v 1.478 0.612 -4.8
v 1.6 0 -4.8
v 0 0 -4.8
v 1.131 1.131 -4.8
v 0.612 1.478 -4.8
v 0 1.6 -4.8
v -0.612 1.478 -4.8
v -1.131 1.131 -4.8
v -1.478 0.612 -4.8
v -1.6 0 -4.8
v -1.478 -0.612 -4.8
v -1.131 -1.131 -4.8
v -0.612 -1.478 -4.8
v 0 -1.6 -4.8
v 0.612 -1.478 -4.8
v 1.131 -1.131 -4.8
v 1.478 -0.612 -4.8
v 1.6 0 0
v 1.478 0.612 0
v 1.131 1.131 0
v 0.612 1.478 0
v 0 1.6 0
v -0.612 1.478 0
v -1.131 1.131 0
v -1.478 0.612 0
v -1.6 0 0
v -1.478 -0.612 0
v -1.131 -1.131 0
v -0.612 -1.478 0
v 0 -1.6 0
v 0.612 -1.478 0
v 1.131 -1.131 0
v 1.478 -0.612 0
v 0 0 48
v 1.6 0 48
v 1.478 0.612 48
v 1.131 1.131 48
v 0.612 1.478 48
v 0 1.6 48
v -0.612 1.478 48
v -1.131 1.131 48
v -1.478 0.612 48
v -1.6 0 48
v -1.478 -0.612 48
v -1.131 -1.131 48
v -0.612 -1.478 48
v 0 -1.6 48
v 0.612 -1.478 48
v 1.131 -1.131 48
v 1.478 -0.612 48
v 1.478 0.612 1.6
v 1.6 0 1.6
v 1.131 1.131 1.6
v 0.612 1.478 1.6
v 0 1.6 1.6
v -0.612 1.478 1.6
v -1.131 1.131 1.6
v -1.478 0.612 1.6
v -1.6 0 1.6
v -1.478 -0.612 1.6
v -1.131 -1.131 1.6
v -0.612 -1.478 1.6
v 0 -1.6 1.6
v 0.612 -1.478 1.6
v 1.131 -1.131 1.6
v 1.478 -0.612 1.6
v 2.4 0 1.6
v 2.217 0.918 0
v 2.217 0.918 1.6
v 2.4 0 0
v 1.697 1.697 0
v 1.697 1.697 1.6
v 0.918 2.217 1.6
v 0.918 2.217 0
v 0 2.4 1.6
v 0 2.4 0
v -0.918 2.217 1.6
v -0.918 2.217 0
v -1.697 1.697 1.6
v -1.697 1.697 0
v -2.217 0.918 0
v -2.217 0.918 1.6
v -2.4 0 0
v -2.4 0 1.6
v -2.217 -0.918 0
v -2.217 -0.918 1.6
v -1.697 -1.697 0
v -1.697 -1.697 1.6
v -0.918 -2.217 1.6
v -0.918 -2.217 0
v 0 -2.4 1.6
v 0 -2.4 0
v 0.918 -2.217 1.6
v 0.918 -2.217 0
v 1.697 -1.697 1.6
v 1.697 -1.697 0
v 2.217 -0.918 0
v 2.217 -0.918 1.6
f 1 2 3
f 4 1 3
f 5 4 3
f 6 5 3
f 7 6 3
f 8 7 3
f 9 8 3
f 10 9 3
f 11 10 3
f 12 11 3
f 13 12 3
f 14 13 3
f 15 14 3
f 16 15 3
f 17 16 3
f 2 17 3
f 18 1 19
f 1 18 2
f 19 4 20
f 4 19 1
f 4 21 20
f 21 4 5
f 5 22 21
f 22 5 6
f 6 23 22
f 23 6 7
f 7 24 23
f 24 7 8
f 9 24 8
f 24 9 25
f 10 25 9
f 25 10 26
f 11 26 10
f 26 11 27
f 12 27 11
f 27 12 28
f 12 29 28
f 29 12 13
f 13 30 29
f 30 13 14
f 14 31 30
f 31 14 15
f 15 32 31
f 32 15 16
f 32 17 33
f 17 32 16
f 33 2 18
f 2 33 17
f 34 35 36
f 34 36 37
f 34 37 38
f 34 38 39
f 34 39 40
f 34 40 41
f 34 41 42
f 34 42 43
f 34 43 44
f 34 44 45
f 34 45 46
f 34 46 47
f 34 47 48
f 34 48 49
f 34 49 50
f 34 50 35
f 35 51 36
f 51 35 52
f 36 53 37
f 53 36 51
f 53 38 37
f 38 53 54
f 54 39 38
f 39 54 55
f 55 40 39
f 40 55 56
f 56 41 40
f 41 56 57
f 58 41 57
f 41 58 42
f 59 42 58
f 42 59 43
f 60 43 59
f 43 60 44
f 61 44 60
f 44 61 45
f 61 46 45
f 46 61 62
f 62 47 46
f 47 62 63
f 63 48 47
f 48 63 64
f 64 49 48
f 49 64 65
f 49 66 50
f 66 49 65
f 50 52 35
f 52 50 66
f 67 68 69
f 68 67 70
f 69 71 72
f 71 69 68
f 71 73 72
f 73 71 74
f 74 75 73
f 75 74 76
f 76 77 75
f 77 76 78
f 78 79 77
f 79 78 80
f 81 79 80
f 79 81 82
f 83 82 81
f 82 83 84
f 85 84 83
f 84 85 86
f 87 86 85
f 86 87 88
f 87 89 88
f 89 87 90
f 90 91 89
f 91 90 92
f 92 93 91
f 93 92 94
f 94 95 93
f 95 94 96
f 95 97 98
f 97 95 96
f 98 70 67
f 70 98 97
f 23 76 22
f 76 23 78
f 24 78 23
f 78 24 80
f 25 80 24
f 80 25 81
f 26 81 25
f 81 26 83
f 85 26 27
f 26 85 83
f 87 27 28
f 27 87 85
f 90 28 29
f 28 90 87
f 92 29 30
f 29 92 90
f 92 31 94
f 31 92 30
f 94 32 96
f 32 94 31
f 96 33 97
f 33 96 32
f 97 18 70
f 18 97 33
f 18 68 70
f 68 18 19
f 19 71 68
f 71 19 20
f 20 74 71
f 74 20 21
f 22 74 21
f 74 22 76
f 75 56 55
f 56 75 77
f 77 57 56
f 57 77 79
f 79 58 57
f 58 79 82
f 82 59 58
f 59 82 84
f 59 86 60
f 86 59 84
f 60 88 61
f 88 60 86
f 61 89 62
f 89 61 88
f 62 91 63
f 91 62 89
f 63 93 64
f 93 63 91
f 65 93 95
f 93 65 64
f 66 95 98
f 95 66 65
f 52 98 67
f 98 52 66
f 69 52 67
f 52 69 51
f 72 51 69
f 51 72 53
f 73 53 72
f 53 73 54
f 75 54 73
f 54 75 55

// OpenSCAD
// file: ../p/4-4edge.scad
use <../lib.scad>
function ldraw_lib__4_4edge() = [
// 0 Circle 1.0
// 0 Name: 4-4edge.dat
// 0 Author: James Jessiman
// 0 !LDRAW_ORG Primitive UPDATE 2017-01
// 0 !LICENSE Licensed under CC BY 2.0 and CC BY 4.0 : see CAreadme.txt
// 
// 0 BFC CERTIFY CCW
  [0,"BFC","CERTIFY"],
  [0,"BFC","CCW"],
// 
// 0 !HISTORY 1998-12-15 [PTadmin] Official Update 1998-10
// 0 !HISTORY 2005-12-28 [PTadmin] Official Update 2005-01
// 0 !HISTORY 2007-06-24 [PTadmin] Header formatted for Contributor Agreement
// 0 !HISTORY 2008-07-01 [PTadmin] Official Update 2008-01
// 0 !HISTORY 2017-01-15 [Steffen] BFCed
// 0 !HISTORY 2017-12-30 [PTadmin] Official Update 2017-01
// 
// 
// 2 24 1 0 0 0.9239 0 0.3827
  [2,24,1,0,0,0.9239,0,0.3827],
// 2 24 0.9239 0 0.3827 0.7071 0 0.7071
  [2,24,0.9239,0,0.3827,0.7071,0,0.7071],
// 2 24 0.7071 0 0.7071 0.3827 0 0.9239
  [2,24,0.7071,0,0.7071,0.3827,0,0.9239],
// 2 24 0.3827 0 0.9239 0 0 1
  [2,24,0.3827,0,0.9239,0,0,1],
// 2 24 0 0 1 -0.3827 0 0.9239
  [2,24,0,0,1,-0.3827,0,0.9239],
// 2 24 -0.3827 0 0.9239 -0.7071 0 0.7071
  [2,24,-0.3827,0,0.9239,-0.7071,0,0.7071],
// 2 24 -0.7071 0 0.7071 -0.9239 0 0.3827
  [2,24,-0.7071,0,0.7071,-0.9239,0,0.3827],
// 2 24 -0.9239 0 0.3827 -1 0 -0
  [2,24,-0.9239,0,0.3827,-1,0,-0],
// 2 24 -1 0 -0 -0.9239 0 -0.3827
  [2,24,-1,0,-0,-0.9239,0,-0.3827],
// 2 24 -0.9239 0 -0.3827 -0.7071 0 -0.7071
  [2,24,-0.9239,0,-0.3827,-0.7071,0,-0.7071],
// 2 24 -0.7071 0 -0.7071 -0.3827 0 -0.9239
  [2,24,-0.7071,0,-0.7071,-0.3827,0,-0.9239],
// 2 24 -0.3827 0 -0.9239 0 0 -1
  [2,24,-0.3827,0,-0.9239,0,0,-1],
// 2 24 0 0 -1 0.3827 0 -0.9239
  [2,24,0,0,-1,0.3827,0,-0.9239],
// 2 24 0.3827 0 -0.9239 0.7071 0 -0.7071
  [2,24,0.3827,0,-0.9239,0.7071,0,-0.7071],
// 2 24 0.7071 0 -0.7071 0.9239 0 -0.3827
  [2,24,0.7071,0,-0.7071,0.9239,0,-0.3827],
// 2 24 0.9239 0 -0.3827 1 0 0
  [2,24,0.9239,0,-0.3827,1,0,0],
];
module ldraw_lib__4_4edge(step=0, col=false, unit=2/5, alt=false, line=0.2, solid=!$preview)
    makepoly(ldraw_lib__4_4edge(), step=step, col=col, unit=unit, alt=alt, line=line, solid=solid);
ldraw_lib__4_4edge(line=0.2);
// file: ../p/4-4disc.scad
use <../lib.scad>
function ldraw_lib__4_4disc() = [
// 0 Disc 1.0
// 0 Name: 4-4disc.dat
// 0 Author: James Jessiman
// 0 !LDRAW_ORG Primitive UPDATE 2002-02
// 0 !LICENSE Licensed under CC BY 2.0 and CC BY 4.0 : see CAreadme.txt
// 
// 0 BFC CERTIFY CCW
  [0,"BFC","CERTIFY"],
  [0,"BFC","CCW"],
// 
// 0 !HISTORY 1998-12-15 [PTadmin] Official Update 1998-10
// 0 !HISTORY 2002-03-23 [sbliss] Added BFC statement
// 0 !HISTORY 2002-04-25 [PTadmin] Official Update 2002-02
// 0 !HISTORY 2007-06-24 [PTadmin] Header formatted for Contributor Agreement
// 0 !HISTORY 2008-07-01 [PTadmin] Official Update 2008-01
// 
// 
// 3 16 0 0 0 1 0 0 0.9239 0 0.3827
  [3,16,0,0,0,1,0,0,0.9239,0,0.3827],
// 3 16 0 0 0 0.9239 0 0.3827 0.7071 0 0.7071
  [3,16,0,0,0,0.9239,0,0.3827,0.7071,0,0.7071],
// 3 16 0 0 0 0.7071 0 0.7071 0.3827 0 0.9239
  [3,16,0,0,0,0.7071,0,0.7071,0.3827,0,0.9239],
// 3 16 0 0 0 0.3827 0 0.9239 0 0 1
  [3,16,0,0,0,0.3827,0,0.9239,0,0,1],
// 3 16 0 0 0 0 0 1 -0.3827 0 0.9239
  [3,16,0,0,0,0,0,1,-0.3827,0,0.9239],
// 3 16 0 0 0 -0.3827 0 0.9239 -0.7071 0 0.7071
  [3,16,0,0,0,-0.3827,0,0.9239,-0.7071,0,0.7071],
// 3 16 0 0 0 -0.7071 0 0.7071 -0.9239 0 0.3827
  [3,16,0,0,0,-0.7071,0,0.7071,-0.9239,0,0.3827],
// 3 16 0 0 0 -0.9239 0 0.3827 -1 0 -0
  [3,16,0,0,0,-0.9239,0,0.3827,-1,0,-0],
// 3 16 0 0 0 -1 0 -0 -0.9239 0 -0.3827
  [3,16,0,0,0,-1,0,-0,-0.9239,0,-0.3827],
// 3 16 0 0 0 -0.9239 0 -0.3827 -0.7071 0 -0.7071
  [3,16,0,0,0,-0.9239,0,-0.3827,-0.7071,0,-0.7071],
// 3 16 0 0 0 -0.7071 0 -0.7071 -0.3827 0 -0.9239
  [3,16,0,0,0,-0.7071,0,-0.7071,-0.3827,0,-0.9239],
// 3 16 0 0 0 -0.3827 0 -0.9239 0 0 -1
  [3,16,0,0,0,-0.3827,0,-0.9239,0,0,-1],
// 3 16 0 0 0 0 0 -1 0.3827 0 -0.9239
  [3,16,0,0,0,0,0,-1,0.3827,0,-0.9239],
// 3 16 0 0 0 0.3827 0 -0.9239 0.7071 0 -0.7071
  [3,16,0,0,0,0.3827,0,-0.9239,0.7071,0,-0.7071],
// 3 16 0 0 0 0.7071 0 -0.7071 0.9239 0 -0.3827
  [3,16,0,0,0,0.7071,0,-0.7071,0.9239,0,-0.3827],
// 3 16 0 0 0 0.9239 0 -0.3827 1 0 0
  [3,16,0,0,0,0.9239,0,-0.3827,1,0,0],
// 0
];
module ldraw_lib__4_4disc(step=0, col=false, unit=2/5, alt=false, line=0.2, solid=!$preview)
    makepoly(ldraw_lib__4_4disc(), step=step, col=col, unit=unit, alt=alt, line=line, solid=solid);
ldraw_lib__4_4disc(line=0.2);
// file: ../p/4-4cyli.scad
use <../lib.scad>
function ldraw_lib__4_4cyli() = [
// 0 Cylinder 1.0
// 0 Name: 4-4cyli.dat
// 0 Author: James Jessiman
// 0 !LDRAW_ORG Primitive UPDATE 2005-01
// 0 !LICENSE Licensed under CC BY 2.0 and CC BY 4.0 : see CAreadme.txt
// 
// 0 BFC CERTIFY CCW
  [0,"BFC","CERTIFY"],
  [0,"BFC","CCW"],
// 
// 0 !HISTORY 1998-12-15 [PTadmin] Official Update 1998-10
// 0 !HISTORY 2002-03-23 [sbliss] Added BFC statement; merged headers from files in distributions LDraw 0.27 and Complete.
// 0 !HISTORY 2002-04-25 [PTadmin] Official Update 2002-02
// 0 !HISTORY 2004-12-14 [guyvivan] BFC CCW
// 0 !HISTORY 2005-12-28 [PTadmin] Official Update 2005-01
// 0 !HISTORY 2007-06-24 [PTadmin] Header formatted for Contributor Agreement
// 0 !HISTORY 2008-07-01 [PTadmin] Official Update 2008-01
// 
// 
// 4 16 1 1 0 0.9239 1 0.3827 0.9239 0 0.3827 1 0 0
  [4,16,1,1,0,0.9239,1,0.3827,0.9239,0,0.3827,1,0,0],
// 5 24 1 0 0 1 1 0 0.9239 0 0.3827 0.9239 0 -0.3827
  [5,24,1,0,0,1,1,0,0.9239,0,0.3827,0.9239,0,-0.3827],
// 4 16 0.9239 1 0.3827 0.7071 1 0.7071 0.7071 0 0.7071 0.9239 0 0.3827
  [4,16,0.9239,1,0.3827,0.7071,1,0.7071,0.7071,0,0.7071,0.9239,0,0.3827],
// 5 24 0.9239 0 0.3827 0.9239 1 0.3827 0.7071 0 0.7071 1 0 0
  [5,24,0.9239,0,0.3827,0.9239,1,0.3827,0.7071,0,0.7071,1,0,0],
// 4 16 0.7071 1 0.7071 0.3827 1 0.9239 0.3827 0 0.9239 0.7071 0 0.7071
  [4,16,0.7071,1,0.7071,0.3827,1,0.9239,0.3827,0,0.9239,0.7071,0,0.7071],
// 5 24 0.7071 0 0.7071 0.7071 1 0.7071 0.3827 0 0.9239 0.9239 0 0.3827
  [5,24,0.7071,0,0.7071,0.7071,1,0.7071,0.3827,0,0.9239,0.9239,0,0.3827],
// 4 16 0.3827 1 0.9239 0 1 1 0 0 1 0.3827 0 0.9239
  [4,16,0.3827,1,0.9239,0,1,1,0,0,1,0.3827,0,0.9239],
// 5 24 0.3827 0 0.9239 0.3827 1 0.9239 0 0 1 0.7071 0 0.7071
  [5,24,0.3827,0,0.9239,0.3827,1,0.9239,0,0,1,0.7071,0,0.7071],
// 4 16 0 1 1 -0.3827 1 0.9239 -0.3827 0 0.9239 0 0 1
  [4,16,0,1,1,-0.3827,1,0.9239,-0.3827,0,0.9239,0,0,1],
// 5 24 0 0 1 0 1 1 -0.3827 0 0.9239 0.3827 0 0.9239
  [5,24,0,0,1,0,1,1,-0.3827,0,0.9239,0.3827,0,0.9239],
// 4 16 -0.3827 1 0.9239 -0.7071 1 0.7071 -0.7071 0 0.7071 -0.3827 0 0.9239
  [4,16,-0.3827,1,0.9239,-0.7071,1,0.7071,-0.7071,0,0.7071,-0.3827,0,0.9239],
// 5 24 -0.3827 0 0.9239 -0.3827 1 0.9239 -0.7071 0 0.7071 0 0 1
  [5,24,-0.3827,0,0.9239,-0.3827,1,0.9239,-0.7071,0,0.7071,0,0,1],
// 4 16 -0.7071 1 0.7071 -0.9239 1 0.3827 -0.9239 0 0.3827 -0.7071 0 0.7071
  [4,16,-0.7071,1,0.7071,-0.9239,1,0.3827,-0.9239,0,0.3827,-0.7071,0,0.7071],
// 5 24 -0.7071 0 0.7071 -0.7071 1 0.7071 -0.9239 0 0.3827 -0.3827 0 0.9239
  [5,24,-0.7071,0,0.7071,-0.7071,1,0.7071,-0.9239,0,0.3827,-0.3827,0,0.9239],
// 4 16 -0.9239 1 0.3827 -1 1 0 -1 0 0 -0.9239 0 0.3827
  [4,16,-0.9239,1,0.3827,-1,1,0,-1,0,0,-0.9239,0,0.3827],
// 5 24 -0.9239 0 0.3827 -0.9239 1 0.3827 -1 0 0 -0.7071 0 0.7071
  [5,24,-0.9239,0,0.3827,-0.9239,1,0.3827,-1,0,0,-0.7071,0,0.7071],
// 4 16 -1 1 0 -0.9239 1 -0.3827 -0.9239 0 -0.3827 -1 0 0
  [4,16,-1,1,0,-0.9239,1,-0.3827,-0.9239,0,-0.3827,-1,0,0],
// 5 24 -1 0 0 -1 1 0 -0.9239 0 -0.3827 -0.9239 0 0.3827
  [5,24,-1,0,0,-1,1,0,-0.9239,0,-0.3827,-0.9239,0,0.3827],
// 4 16 -0.9239 1 -0.3827 -0.7071 1 -0.7071 -0.7071 0 -0.7071 -0.9239 0 -0.3827
  [4,16,-0.9239,1,-0.3827,-0.7071,1,-0.7071,-0.7071,0,-0.7071,-0.9239,0,-0.3827],
// 5 24 -0.9239 0 -0.3827 -0.9239 1 -0.3827 -0.7071 0 -0.7071 -1 0 0
  [5,24,-0.9239,0,-0.3827,-0.9239,1,-0.3827,-0.7071,0,-0.7071,-1,0,0],
// 4 16 -0.7071 1 -0.7071 -0.3827 1 -0.9239 -0.3827 0 -0.9239 -0.7071 0 -0.7071
  [4,16,-0.7071,1,-0.7071,-0.3827,1,-0.9239,-0.3827,0,-0.9239,-0.7071,0,-0.7071],
// 5 24 -0.7071 0 -0.7071 -0.7071 1 -0.7071 -0.3827 0 -0.9239 -0.9239 0 -0.3827
  [5,24,-0.7071,0,-0.7071,-0.7071,1,-0.7071,-0.3827,0,-0.9239,-0.9239,0,-0.3827],
// 4 16 -0.3827 1 -0.9239 0 1 -1 0 0 -1 -0.3827 0 -0.9239
  [4,16,-0.3827,1,-0.9239,0,1,-1,0,0,-1,-0.3827,0,-0.9239],
// 5 24 -0.3827 0 -0.9239 -0.3827 1 -0.9239 0 0 -1 -0.7071 0 -0.7071
  [5,24,-0.3827,0,-0.9239,-0.3827,1,-0.9239,0,0,-1,-0.7071,0,-0.7071],
// 4 16 0 1 -1 0.3827 1 -0.9239 0.3827 0 -0.9239 0 0 -1
  [4,16,0,1,-1,0.3827,1,-0.9239,0.3827,0,-0.9239,0,0,-1],
// 5 24 0 0 -1 0 1 -1 0.3827 0 -0.9239 -0.3827 0 -0.9239
  [5,24,0,0,-1,0,1,-1,0.3827,0,-0.9239,-0.3827,0,-0.9239],
// 4 16 0.3827 1 -0.9239 0.7071 1 -0.7071 0.7071 0 -0.7071 0.3827 0 -0.9239
  [4,16,0.3827,1,-0.9239,0.7071,1,-0.7071,0.7071,0,-0.7071,0.3827,0,-0.9239],
// 5 24 0.3827 0 -0.9239 0.3827 1 -0.9239 0.7071 0 -0.7071 0 0 -1
  [5,24,0.3827,0,-0.9239,0.3827,1,-0.9239,0.7071,0,-0.7071,0,0,-1],
// 4 16 0.7071 1 -0.7071 0.9239 1 -0.3827 0.9239 0 -0.3827 0.7071 0 -0.7071
  [4,16,0.7071,1,-0.7071,0.9239,1,-0.3827,0.9239,0,-0.3827,0.7071,0,-0.7071],
// 5 24 0.7071 0 -0.7071 0.7071 1 -0.7071 0.9239 0 -0.3827 0.3827 0 -0.9239
  [5,24,0.7071,0,-0.7071,0.7071,1,-0.7071,0.9239,0,-0.3827,0.3827,0,-0.9239],
// 4 16 0.9239 1 -0.3827 1 1 0 1 0 0 0.9239 0 -0.3827
  [4,16,0.9239,1,-0.3827,1,1,0,1,0,0,0.9239,0,-0.3827],
// 5 24 0.9239 0 -0.3827 0.9239 1 -0.3827 1 0 0 0.7071 0 -0.7071
  [5,24,0.9239,0,-0.3827,0.9239,1,-0.3827,1,0,0,0.7071,0,-0.7071],
// 0
];
module ldraw_lib__4_4cyli(step=0, col=false, unit=2/5, alt=false, line=0.2, solid=!$preview)
    makepoly(ldraw_lib__4_4cyli(), step=step, col=col, unit=unit, alt=alt, line=line, solid=solid);
ldraw_lib__4_4cyli(line=0.2);
// file: ../p/4-4ring2.scad
use <../lib.scad>
function ldraw_lib__4_4ring2() = [
// 0 Ring  2 x 1.0
// 0 Name: 4-4ring2.dat
// 0 Author: James Jessiman
// 0 !LDRAW_ORG Primitive UPDATE 2009-01
// 0 !LICENSE Licensed under CC BY 2.0 and CC BY 4.0 : see CAreadme.txt
// 
// 0 BFC CERTIFY CCW
  [0,"BFC","CERTIFY"],
  [0,"BFC","CCW"],
// 
// 0 !HISTORY 1998-12-15 [PTadmin] Official Update 1998-10
// 0 !HISTORY 2002-04-05 [hafhead] Added BFC statement
// 0 !HISTORY 2002-04-25 [PTadmin] Official Update 2002-02
// 0 !HISTORY 2007-06-24 [PTadmin] Header formatted for Contributor Agreement
// 0 !HISTORY 2008-07-01 [PTadmin] Official Update 2008-01
// 0 !HISTORY 2008-08-26 [cwdee] Switch polygon winding and rename
// 0 !HISTORY 2009-05-02 [PTadmin] Official Update 2009-01
// 
// 
// 4 16 -1.1481 0 2.7717 -0.7654 0 1.8478 0 0 2 0 0 3
  [4,16,-1.1481,0,2.7717,-0.7654,0,1.8478,0,0,2,0,0,3],
// 4 16 -2.1213 0 2.1213 -1.4142 0 1.4142 -0.7654 0 1.8478 -1.1481 0 2.7717
  [4,16,-2.1213,0,2.1213,-1.4142,0,1.4142,-0.7654,0,1.8478,-1.1481,0,2.7717],
// 4 16 -2.7717 0 1.1481 -1.8478 0 0.7654 -1.4142 0 1.4142 -2.1213 0 2.1213
  [4,16,-2.7717,0,1.1481,-1.8478,0,0.7654,-1.4142,0,1.4142,-2.1213,0,2.1213],
// 4 16 -3 0 0 -2 0 0 -1.8478 0 0.7654 -2.7717 0 1.1481
  [4,16,-3,0,0,-2,0,0,-1.8478,0,0.7654,-2.7717,0,1.1481],
// 4 16 -2.7717 0 -1.1481 -1.8478 0 -0.7654 -2 0 0 -3 0 0
  [4,16,-2.7717,0,-1.1481,-1.8478,0,-0.7654,-2,0,0,-3,0,0],
// 4 16 -2.1213 0 -2.1213 -1.4142 0 -1.4142 -1.8478 0 -0.7654 -2.7717 0 -1.1481
  [4,16,-2.1213,0,-2.1213,-1.4142,0,-1.4142,-1.8478,0,-0.7654,-2.7717,0,-1.1481],
// 4 16 -1.1481 0 -2.7717 -0.7654 0 -1.8478 -1.4142 0 -1.4142 -2.1213 0 -2.1213
  [4,16,-1.1481,0,-2.7717,-0.7654,0,-1.8478,-1.4142,0,-1.4142,-2.1213,0,-2.1213],
// 4 16 0 0 -3 0 0 -2 -0.7654 0 -1.8478 -1.1481 0 -2.7717
  [4,16,0,0,-3,0,0,-2,-0.7654,0,-1.8478,-1.1481,0,-2.7717],
// 4 16 1.1481 0 -2.7717 0.7654 0 -1.8478 0 0 -2 0 0 -3
  [4,16,1.1481,0,-2.7717,0.7654,0,-1.8478,0,0,-2,0,0,-3],
// 4 16 2.1213 0 -2.1213 1.4142 0 -1.4142 0.7654 0 -1.8478 1.1481 0 -2.7717
  [4,16,2.1213,0,-2.1213,1.4142,0,-1.4142,0.7654,0,-1.8478,1.1481,0,-2.7717],
// 4 16 2.7717 0 -1.1481 1.8478 0 -0.7654 1.4142 0 -1.4142 2.1213 0 -2.1213
  [4,16,2.7717,0,-1.1481,1.8478,0,-0.7654,1.4142,0,-1.4142,2.1213,0,-2.1213],
// 4 16 3 0 0 2 0 0 1.8478 0 -0.7654 2.7717 0 -1.1481
  [4,16,3,0,0,2,0,0,1.8478,0,-0.7654,2.7717,0,-1.1481],
// 4 16 2.7717 0 1.1481 1.8478 0 0.7654 2 0 0 3 0 0
  [4,16,2.7717,0,1.1481,1.8478,0,0.7654,2,0,0,3,0,0],
// 4 16 2.1213 0 2.1213 1.4142 0 1.4142 1.8478 0 0.7654 2.7717 0 1.1481
  [4,16,2.1213,0,2.1213,1.4142,0,1.4142,1.8478,0,0.7654,2.7717,0,1.1481],
// 4 16 1.1481 0 2.7717 0.7654 0 1.8478 1.4142 0 1.4142 2.1213 0 2.1213
  [4,16,1.1481,0,2.7717,0.7654,0,1.8478,1.4142,0,1.4142,2.1213,0,2.1213],
// 4 16 0 0 3 0 0 2 0.7654 0 1.8478 1.1481 0 2.7717
  [4,16,0,0,3,0,0,2,0.7654,0,1.8478,1.1481,0,2.7717],
// 0
];
module ldraw_lib__4_4ring2(step=0, col=false, unit=2/5, alt=false, line=0.2, solid=!$preview)
    makepoly(ldraw_lib__4_4ring2(), step=step, col=col, unit=unit, alt=alt, line=line, solid=solid);
ldraw_lib__4_4ring2(line=0.2);
// file: ../p/4-4cylo.scad
use <../lib.scad>
use <4-4cyli.scad>
use <4-4edge.scad>
function ldraw_lib__4_4cylo() = [
// 0 Cylinder Open 1.0
// 0 Name: 4-4cylo.dat
// 0 Author: Mark Kennedy [mkennedy]
// 0 !LDRAW_ORG Primitive UPDATE 2010-01
// 0 !LICENSE Licensed under CC BY 2.0 and CC BY 4.0 : see CAreadme.txt
// 
// 0 BFC CERTIFY CCW
  [0,"BFC","CERTIFY"],
  [0,"BFC","CCW"],
// 
// 0 !HISTORY 2010-04-05 [PTadmin] Official Update 2010-01
// 
// 
// 1 16 0 0 0 1 0 0 0 1 0 0 0 1 4-4edge.dat
  [1,16,0,0,0,1,0,0,0,1,0,0,0,1, ldraw_lib__4_4edge()],
// 1 16 0 1 0 1 0 0 0 1 0 0 0 1 4-4edge.dat
  [1,16,0,1,0,1,0,0,0,1,0,0,0,1, ldraw_lib__4_4edge()],
// 1 16 0 0 0 1 0 0 0 1 0 0 0 1 4-4cyli.dat
  [1,16,0,0,0,1,0,0,0,1,0,0,0,1, ldraw_lib__4_4cyli()],
// 0
];
module ldraw_lib__4_4cylo(step=0, col=false, unit=2/5, alt=false, line=0.2, solid=!$preview)
    makepoly(ldraw_lib__4_4cylo(), step=step, col=col, unit=unit, alt=alt, line=line, solid=solid);
ldraw_lib__4_4cylo(line=0.2);
// file: ../p/4-4cylc.scad
use <../lib.scad>
use <4-4cyli.scad>
use <4-4disc.scad>
use <4-4edge.scad>
function ldraw_lib__4_4cylc() = [
// 0 Cylinder Closed 1.0
// 0 Name: 4-4cylc.dat
// 0 Author: Alex Taylor [anathema]
// 0 !LDRAW_ORG Primitive UPDATE 2009-02
// 0 !LICENSE Licensed under CC BY 2.0 and CC BY 4.0 : see CAreadme.txt
// 
// 0 BFC CERTIFY CCW
  [0,"BFC","CERTIFY"],
  [0,"BFC","CCW"],
// 
// 0 !HISTORY 2008-12-29 [cwdee] Removed one disc
// 0 !HISTORY 2009-09-03 [PTadmin] Official Update 2009-02
// 
// 
// 1 16 0 0 0 1 0 0 0 1 0 0 0 1 4-4edge.dat
  [1,16,0,0,0,1,0,0,0,1,0,0,0,1, ldraw_lib__4_4edge()],
// 1 16 0 1 0 1 0 0 0 1 0 0 0 1 4-4edge.dat
  [1,16,0,1,0,1,0,0,0,1,0,0,0,1, ldraw_lib__4_4edge()],
// 1 16 0 0 0 1 0 0 0 1 0 0 0 1 4-4disc.dat
  [1,16,0,0,0,1,0,0,0,1,0,0,0,1, ldraw_lib__4_4disc()],
// 1 16 0 0 0 1 0 0 0 1 0 0 0 1 4-4cyli.dat
  [1,16,0,0,0,1,0,0,0,1,0,0,0,1, ldraw_lib__4_4cyli()],
// 0
];
module ldraw_lib__4_4cylc(step=0, col=false, unit=2/5, alt=false, line=0.2, solid=!$preview)
    makepoly(ldraw_lib__4_4cylc(), step=step, col=col, unit=unit, alt=alt, line=line, solid=solid);
ldraw_lib__4_4cylc(line=0.2);
// file: 4095.scad
use <../lib.scad>
use <../p/4-4cylc.scad>
use <../p/4-4cylo.scad>
use <../p/4-4ring2.scad>
function ldraw_lib__4095() = [
// 0 Bar  6.6L with Stop
// 0 Name: 4095.dat
// 0 Author: James Jessiman
// 0 !LDRAW_ORG Part UPDATE 2010-03
// 0 !LICENSE Licensed under CC BY 2.0 and CC BY 4.0 : see CAreadme.txt
// 
// 0 BFC CERTIFY CCW
  [0,"BFC","CERTIFY"],
  [0,"BFC","CCW"],
// 
// 0 !KEYWORDS pole, rod, Small, stand, town, umbrella
// 
// 0 !HISTORY 2010-10-21 [westrate] CA rewrite; use cylc, cylo, and ring primitives
// 0 !HISTORY 2010-12-31 [PTadmin] Official Update 2010-03
// 
// 
// 1 16 0 12 0 4 0 0 0 -12 0 0 0 4 4-4cylc.dat
  [1,16,0,12,0,4,0,0,0,-12,0,0,0,4, ldraw_lib__4_4cylc()],
// 1 16 0 -120 0 4 0 0 0 116 0 0 0 4 4-4cylc.dat
  [1,16,0,-120,0,4,0,0,0,116,0,0,0,4, ldraw_lib__4_4cylc()],
// 1 16 0 0 0 6 0 0 0 -4 0 0 0 6 4-4cylo.dat
  [1,16,0,0,0,6,0,0,0,-4,0,0,0,6, ldraw_lib__4_4cylo()],
// 1 16 0 0 0 2 0 0 0 -1 0 0 0 2 4-4ring2.dat
  [1,16,0,0,0,2,0,0,0,-1,0,0,0,2, ldraw_lib__4_4ring2()],
// 1 16 0 -4 0 2 0 0 0 1 0 0 0 2 4-4ring2.dat
  [1,16,0,-4,0,2,0,0,0,1,0,0,0,2, ldraw_lib__4_4ring2()],
// 0
];
module ldraw_lib__4095(step=0, col=false, unit=2/5, alt=false, line=0.2, solid=!$preview)
    makepoly(ldraw_lib__4095(), step=step, col=col, unit=unit, alt=alt, line=line, solid=solid);
ldraw_lib__4095(line=0.2);
// main file
use <../lib.scad>
use <4095.scad>
function ldraw_lib__352() = [
// 0 ~Moved to 4095
// 0 Name: 352.dat
// 0 Author: [PTadmin]
// 0 !LDRAW_ORG Part UPDATE 1999-03
// 0 !LICENSE Licensed under CC BY 4.0 : see CAreadme.txt
// 
// 0 BFC CERTIFY CCW
  [0,"BFC","CERTIFY"],
  [0,"BFC","CCW"],
// 
// 0 !HISTORY 1999-05-17 [PTadmin] Official Update 1999-03
// 0 !HISTORY 2007-06-25 [PTadmin] Header formatted for Contributor Agreement
// 0 !HISTORY 2008-07-01 [PTadmin] Official Update 2008-01
// 
// 
// 1 16 0 0 0 1 0 0 0 1 0 0 0 1 4095.dat
  [1,16,0,0,0,1,0,0,0,1,0,0,0,1, ldraw_lib__4095()],
];
module ldraw_lib__352(step=0, col=false, unit=2/5, alt=false, line=0.2, solid=!$preview)
    makepoly(ldraw_lib__352(), step=step, col=col, unit=unit, alt=alt, line=line, solid=solid);
ldraw_lib__352(line=0.2);
